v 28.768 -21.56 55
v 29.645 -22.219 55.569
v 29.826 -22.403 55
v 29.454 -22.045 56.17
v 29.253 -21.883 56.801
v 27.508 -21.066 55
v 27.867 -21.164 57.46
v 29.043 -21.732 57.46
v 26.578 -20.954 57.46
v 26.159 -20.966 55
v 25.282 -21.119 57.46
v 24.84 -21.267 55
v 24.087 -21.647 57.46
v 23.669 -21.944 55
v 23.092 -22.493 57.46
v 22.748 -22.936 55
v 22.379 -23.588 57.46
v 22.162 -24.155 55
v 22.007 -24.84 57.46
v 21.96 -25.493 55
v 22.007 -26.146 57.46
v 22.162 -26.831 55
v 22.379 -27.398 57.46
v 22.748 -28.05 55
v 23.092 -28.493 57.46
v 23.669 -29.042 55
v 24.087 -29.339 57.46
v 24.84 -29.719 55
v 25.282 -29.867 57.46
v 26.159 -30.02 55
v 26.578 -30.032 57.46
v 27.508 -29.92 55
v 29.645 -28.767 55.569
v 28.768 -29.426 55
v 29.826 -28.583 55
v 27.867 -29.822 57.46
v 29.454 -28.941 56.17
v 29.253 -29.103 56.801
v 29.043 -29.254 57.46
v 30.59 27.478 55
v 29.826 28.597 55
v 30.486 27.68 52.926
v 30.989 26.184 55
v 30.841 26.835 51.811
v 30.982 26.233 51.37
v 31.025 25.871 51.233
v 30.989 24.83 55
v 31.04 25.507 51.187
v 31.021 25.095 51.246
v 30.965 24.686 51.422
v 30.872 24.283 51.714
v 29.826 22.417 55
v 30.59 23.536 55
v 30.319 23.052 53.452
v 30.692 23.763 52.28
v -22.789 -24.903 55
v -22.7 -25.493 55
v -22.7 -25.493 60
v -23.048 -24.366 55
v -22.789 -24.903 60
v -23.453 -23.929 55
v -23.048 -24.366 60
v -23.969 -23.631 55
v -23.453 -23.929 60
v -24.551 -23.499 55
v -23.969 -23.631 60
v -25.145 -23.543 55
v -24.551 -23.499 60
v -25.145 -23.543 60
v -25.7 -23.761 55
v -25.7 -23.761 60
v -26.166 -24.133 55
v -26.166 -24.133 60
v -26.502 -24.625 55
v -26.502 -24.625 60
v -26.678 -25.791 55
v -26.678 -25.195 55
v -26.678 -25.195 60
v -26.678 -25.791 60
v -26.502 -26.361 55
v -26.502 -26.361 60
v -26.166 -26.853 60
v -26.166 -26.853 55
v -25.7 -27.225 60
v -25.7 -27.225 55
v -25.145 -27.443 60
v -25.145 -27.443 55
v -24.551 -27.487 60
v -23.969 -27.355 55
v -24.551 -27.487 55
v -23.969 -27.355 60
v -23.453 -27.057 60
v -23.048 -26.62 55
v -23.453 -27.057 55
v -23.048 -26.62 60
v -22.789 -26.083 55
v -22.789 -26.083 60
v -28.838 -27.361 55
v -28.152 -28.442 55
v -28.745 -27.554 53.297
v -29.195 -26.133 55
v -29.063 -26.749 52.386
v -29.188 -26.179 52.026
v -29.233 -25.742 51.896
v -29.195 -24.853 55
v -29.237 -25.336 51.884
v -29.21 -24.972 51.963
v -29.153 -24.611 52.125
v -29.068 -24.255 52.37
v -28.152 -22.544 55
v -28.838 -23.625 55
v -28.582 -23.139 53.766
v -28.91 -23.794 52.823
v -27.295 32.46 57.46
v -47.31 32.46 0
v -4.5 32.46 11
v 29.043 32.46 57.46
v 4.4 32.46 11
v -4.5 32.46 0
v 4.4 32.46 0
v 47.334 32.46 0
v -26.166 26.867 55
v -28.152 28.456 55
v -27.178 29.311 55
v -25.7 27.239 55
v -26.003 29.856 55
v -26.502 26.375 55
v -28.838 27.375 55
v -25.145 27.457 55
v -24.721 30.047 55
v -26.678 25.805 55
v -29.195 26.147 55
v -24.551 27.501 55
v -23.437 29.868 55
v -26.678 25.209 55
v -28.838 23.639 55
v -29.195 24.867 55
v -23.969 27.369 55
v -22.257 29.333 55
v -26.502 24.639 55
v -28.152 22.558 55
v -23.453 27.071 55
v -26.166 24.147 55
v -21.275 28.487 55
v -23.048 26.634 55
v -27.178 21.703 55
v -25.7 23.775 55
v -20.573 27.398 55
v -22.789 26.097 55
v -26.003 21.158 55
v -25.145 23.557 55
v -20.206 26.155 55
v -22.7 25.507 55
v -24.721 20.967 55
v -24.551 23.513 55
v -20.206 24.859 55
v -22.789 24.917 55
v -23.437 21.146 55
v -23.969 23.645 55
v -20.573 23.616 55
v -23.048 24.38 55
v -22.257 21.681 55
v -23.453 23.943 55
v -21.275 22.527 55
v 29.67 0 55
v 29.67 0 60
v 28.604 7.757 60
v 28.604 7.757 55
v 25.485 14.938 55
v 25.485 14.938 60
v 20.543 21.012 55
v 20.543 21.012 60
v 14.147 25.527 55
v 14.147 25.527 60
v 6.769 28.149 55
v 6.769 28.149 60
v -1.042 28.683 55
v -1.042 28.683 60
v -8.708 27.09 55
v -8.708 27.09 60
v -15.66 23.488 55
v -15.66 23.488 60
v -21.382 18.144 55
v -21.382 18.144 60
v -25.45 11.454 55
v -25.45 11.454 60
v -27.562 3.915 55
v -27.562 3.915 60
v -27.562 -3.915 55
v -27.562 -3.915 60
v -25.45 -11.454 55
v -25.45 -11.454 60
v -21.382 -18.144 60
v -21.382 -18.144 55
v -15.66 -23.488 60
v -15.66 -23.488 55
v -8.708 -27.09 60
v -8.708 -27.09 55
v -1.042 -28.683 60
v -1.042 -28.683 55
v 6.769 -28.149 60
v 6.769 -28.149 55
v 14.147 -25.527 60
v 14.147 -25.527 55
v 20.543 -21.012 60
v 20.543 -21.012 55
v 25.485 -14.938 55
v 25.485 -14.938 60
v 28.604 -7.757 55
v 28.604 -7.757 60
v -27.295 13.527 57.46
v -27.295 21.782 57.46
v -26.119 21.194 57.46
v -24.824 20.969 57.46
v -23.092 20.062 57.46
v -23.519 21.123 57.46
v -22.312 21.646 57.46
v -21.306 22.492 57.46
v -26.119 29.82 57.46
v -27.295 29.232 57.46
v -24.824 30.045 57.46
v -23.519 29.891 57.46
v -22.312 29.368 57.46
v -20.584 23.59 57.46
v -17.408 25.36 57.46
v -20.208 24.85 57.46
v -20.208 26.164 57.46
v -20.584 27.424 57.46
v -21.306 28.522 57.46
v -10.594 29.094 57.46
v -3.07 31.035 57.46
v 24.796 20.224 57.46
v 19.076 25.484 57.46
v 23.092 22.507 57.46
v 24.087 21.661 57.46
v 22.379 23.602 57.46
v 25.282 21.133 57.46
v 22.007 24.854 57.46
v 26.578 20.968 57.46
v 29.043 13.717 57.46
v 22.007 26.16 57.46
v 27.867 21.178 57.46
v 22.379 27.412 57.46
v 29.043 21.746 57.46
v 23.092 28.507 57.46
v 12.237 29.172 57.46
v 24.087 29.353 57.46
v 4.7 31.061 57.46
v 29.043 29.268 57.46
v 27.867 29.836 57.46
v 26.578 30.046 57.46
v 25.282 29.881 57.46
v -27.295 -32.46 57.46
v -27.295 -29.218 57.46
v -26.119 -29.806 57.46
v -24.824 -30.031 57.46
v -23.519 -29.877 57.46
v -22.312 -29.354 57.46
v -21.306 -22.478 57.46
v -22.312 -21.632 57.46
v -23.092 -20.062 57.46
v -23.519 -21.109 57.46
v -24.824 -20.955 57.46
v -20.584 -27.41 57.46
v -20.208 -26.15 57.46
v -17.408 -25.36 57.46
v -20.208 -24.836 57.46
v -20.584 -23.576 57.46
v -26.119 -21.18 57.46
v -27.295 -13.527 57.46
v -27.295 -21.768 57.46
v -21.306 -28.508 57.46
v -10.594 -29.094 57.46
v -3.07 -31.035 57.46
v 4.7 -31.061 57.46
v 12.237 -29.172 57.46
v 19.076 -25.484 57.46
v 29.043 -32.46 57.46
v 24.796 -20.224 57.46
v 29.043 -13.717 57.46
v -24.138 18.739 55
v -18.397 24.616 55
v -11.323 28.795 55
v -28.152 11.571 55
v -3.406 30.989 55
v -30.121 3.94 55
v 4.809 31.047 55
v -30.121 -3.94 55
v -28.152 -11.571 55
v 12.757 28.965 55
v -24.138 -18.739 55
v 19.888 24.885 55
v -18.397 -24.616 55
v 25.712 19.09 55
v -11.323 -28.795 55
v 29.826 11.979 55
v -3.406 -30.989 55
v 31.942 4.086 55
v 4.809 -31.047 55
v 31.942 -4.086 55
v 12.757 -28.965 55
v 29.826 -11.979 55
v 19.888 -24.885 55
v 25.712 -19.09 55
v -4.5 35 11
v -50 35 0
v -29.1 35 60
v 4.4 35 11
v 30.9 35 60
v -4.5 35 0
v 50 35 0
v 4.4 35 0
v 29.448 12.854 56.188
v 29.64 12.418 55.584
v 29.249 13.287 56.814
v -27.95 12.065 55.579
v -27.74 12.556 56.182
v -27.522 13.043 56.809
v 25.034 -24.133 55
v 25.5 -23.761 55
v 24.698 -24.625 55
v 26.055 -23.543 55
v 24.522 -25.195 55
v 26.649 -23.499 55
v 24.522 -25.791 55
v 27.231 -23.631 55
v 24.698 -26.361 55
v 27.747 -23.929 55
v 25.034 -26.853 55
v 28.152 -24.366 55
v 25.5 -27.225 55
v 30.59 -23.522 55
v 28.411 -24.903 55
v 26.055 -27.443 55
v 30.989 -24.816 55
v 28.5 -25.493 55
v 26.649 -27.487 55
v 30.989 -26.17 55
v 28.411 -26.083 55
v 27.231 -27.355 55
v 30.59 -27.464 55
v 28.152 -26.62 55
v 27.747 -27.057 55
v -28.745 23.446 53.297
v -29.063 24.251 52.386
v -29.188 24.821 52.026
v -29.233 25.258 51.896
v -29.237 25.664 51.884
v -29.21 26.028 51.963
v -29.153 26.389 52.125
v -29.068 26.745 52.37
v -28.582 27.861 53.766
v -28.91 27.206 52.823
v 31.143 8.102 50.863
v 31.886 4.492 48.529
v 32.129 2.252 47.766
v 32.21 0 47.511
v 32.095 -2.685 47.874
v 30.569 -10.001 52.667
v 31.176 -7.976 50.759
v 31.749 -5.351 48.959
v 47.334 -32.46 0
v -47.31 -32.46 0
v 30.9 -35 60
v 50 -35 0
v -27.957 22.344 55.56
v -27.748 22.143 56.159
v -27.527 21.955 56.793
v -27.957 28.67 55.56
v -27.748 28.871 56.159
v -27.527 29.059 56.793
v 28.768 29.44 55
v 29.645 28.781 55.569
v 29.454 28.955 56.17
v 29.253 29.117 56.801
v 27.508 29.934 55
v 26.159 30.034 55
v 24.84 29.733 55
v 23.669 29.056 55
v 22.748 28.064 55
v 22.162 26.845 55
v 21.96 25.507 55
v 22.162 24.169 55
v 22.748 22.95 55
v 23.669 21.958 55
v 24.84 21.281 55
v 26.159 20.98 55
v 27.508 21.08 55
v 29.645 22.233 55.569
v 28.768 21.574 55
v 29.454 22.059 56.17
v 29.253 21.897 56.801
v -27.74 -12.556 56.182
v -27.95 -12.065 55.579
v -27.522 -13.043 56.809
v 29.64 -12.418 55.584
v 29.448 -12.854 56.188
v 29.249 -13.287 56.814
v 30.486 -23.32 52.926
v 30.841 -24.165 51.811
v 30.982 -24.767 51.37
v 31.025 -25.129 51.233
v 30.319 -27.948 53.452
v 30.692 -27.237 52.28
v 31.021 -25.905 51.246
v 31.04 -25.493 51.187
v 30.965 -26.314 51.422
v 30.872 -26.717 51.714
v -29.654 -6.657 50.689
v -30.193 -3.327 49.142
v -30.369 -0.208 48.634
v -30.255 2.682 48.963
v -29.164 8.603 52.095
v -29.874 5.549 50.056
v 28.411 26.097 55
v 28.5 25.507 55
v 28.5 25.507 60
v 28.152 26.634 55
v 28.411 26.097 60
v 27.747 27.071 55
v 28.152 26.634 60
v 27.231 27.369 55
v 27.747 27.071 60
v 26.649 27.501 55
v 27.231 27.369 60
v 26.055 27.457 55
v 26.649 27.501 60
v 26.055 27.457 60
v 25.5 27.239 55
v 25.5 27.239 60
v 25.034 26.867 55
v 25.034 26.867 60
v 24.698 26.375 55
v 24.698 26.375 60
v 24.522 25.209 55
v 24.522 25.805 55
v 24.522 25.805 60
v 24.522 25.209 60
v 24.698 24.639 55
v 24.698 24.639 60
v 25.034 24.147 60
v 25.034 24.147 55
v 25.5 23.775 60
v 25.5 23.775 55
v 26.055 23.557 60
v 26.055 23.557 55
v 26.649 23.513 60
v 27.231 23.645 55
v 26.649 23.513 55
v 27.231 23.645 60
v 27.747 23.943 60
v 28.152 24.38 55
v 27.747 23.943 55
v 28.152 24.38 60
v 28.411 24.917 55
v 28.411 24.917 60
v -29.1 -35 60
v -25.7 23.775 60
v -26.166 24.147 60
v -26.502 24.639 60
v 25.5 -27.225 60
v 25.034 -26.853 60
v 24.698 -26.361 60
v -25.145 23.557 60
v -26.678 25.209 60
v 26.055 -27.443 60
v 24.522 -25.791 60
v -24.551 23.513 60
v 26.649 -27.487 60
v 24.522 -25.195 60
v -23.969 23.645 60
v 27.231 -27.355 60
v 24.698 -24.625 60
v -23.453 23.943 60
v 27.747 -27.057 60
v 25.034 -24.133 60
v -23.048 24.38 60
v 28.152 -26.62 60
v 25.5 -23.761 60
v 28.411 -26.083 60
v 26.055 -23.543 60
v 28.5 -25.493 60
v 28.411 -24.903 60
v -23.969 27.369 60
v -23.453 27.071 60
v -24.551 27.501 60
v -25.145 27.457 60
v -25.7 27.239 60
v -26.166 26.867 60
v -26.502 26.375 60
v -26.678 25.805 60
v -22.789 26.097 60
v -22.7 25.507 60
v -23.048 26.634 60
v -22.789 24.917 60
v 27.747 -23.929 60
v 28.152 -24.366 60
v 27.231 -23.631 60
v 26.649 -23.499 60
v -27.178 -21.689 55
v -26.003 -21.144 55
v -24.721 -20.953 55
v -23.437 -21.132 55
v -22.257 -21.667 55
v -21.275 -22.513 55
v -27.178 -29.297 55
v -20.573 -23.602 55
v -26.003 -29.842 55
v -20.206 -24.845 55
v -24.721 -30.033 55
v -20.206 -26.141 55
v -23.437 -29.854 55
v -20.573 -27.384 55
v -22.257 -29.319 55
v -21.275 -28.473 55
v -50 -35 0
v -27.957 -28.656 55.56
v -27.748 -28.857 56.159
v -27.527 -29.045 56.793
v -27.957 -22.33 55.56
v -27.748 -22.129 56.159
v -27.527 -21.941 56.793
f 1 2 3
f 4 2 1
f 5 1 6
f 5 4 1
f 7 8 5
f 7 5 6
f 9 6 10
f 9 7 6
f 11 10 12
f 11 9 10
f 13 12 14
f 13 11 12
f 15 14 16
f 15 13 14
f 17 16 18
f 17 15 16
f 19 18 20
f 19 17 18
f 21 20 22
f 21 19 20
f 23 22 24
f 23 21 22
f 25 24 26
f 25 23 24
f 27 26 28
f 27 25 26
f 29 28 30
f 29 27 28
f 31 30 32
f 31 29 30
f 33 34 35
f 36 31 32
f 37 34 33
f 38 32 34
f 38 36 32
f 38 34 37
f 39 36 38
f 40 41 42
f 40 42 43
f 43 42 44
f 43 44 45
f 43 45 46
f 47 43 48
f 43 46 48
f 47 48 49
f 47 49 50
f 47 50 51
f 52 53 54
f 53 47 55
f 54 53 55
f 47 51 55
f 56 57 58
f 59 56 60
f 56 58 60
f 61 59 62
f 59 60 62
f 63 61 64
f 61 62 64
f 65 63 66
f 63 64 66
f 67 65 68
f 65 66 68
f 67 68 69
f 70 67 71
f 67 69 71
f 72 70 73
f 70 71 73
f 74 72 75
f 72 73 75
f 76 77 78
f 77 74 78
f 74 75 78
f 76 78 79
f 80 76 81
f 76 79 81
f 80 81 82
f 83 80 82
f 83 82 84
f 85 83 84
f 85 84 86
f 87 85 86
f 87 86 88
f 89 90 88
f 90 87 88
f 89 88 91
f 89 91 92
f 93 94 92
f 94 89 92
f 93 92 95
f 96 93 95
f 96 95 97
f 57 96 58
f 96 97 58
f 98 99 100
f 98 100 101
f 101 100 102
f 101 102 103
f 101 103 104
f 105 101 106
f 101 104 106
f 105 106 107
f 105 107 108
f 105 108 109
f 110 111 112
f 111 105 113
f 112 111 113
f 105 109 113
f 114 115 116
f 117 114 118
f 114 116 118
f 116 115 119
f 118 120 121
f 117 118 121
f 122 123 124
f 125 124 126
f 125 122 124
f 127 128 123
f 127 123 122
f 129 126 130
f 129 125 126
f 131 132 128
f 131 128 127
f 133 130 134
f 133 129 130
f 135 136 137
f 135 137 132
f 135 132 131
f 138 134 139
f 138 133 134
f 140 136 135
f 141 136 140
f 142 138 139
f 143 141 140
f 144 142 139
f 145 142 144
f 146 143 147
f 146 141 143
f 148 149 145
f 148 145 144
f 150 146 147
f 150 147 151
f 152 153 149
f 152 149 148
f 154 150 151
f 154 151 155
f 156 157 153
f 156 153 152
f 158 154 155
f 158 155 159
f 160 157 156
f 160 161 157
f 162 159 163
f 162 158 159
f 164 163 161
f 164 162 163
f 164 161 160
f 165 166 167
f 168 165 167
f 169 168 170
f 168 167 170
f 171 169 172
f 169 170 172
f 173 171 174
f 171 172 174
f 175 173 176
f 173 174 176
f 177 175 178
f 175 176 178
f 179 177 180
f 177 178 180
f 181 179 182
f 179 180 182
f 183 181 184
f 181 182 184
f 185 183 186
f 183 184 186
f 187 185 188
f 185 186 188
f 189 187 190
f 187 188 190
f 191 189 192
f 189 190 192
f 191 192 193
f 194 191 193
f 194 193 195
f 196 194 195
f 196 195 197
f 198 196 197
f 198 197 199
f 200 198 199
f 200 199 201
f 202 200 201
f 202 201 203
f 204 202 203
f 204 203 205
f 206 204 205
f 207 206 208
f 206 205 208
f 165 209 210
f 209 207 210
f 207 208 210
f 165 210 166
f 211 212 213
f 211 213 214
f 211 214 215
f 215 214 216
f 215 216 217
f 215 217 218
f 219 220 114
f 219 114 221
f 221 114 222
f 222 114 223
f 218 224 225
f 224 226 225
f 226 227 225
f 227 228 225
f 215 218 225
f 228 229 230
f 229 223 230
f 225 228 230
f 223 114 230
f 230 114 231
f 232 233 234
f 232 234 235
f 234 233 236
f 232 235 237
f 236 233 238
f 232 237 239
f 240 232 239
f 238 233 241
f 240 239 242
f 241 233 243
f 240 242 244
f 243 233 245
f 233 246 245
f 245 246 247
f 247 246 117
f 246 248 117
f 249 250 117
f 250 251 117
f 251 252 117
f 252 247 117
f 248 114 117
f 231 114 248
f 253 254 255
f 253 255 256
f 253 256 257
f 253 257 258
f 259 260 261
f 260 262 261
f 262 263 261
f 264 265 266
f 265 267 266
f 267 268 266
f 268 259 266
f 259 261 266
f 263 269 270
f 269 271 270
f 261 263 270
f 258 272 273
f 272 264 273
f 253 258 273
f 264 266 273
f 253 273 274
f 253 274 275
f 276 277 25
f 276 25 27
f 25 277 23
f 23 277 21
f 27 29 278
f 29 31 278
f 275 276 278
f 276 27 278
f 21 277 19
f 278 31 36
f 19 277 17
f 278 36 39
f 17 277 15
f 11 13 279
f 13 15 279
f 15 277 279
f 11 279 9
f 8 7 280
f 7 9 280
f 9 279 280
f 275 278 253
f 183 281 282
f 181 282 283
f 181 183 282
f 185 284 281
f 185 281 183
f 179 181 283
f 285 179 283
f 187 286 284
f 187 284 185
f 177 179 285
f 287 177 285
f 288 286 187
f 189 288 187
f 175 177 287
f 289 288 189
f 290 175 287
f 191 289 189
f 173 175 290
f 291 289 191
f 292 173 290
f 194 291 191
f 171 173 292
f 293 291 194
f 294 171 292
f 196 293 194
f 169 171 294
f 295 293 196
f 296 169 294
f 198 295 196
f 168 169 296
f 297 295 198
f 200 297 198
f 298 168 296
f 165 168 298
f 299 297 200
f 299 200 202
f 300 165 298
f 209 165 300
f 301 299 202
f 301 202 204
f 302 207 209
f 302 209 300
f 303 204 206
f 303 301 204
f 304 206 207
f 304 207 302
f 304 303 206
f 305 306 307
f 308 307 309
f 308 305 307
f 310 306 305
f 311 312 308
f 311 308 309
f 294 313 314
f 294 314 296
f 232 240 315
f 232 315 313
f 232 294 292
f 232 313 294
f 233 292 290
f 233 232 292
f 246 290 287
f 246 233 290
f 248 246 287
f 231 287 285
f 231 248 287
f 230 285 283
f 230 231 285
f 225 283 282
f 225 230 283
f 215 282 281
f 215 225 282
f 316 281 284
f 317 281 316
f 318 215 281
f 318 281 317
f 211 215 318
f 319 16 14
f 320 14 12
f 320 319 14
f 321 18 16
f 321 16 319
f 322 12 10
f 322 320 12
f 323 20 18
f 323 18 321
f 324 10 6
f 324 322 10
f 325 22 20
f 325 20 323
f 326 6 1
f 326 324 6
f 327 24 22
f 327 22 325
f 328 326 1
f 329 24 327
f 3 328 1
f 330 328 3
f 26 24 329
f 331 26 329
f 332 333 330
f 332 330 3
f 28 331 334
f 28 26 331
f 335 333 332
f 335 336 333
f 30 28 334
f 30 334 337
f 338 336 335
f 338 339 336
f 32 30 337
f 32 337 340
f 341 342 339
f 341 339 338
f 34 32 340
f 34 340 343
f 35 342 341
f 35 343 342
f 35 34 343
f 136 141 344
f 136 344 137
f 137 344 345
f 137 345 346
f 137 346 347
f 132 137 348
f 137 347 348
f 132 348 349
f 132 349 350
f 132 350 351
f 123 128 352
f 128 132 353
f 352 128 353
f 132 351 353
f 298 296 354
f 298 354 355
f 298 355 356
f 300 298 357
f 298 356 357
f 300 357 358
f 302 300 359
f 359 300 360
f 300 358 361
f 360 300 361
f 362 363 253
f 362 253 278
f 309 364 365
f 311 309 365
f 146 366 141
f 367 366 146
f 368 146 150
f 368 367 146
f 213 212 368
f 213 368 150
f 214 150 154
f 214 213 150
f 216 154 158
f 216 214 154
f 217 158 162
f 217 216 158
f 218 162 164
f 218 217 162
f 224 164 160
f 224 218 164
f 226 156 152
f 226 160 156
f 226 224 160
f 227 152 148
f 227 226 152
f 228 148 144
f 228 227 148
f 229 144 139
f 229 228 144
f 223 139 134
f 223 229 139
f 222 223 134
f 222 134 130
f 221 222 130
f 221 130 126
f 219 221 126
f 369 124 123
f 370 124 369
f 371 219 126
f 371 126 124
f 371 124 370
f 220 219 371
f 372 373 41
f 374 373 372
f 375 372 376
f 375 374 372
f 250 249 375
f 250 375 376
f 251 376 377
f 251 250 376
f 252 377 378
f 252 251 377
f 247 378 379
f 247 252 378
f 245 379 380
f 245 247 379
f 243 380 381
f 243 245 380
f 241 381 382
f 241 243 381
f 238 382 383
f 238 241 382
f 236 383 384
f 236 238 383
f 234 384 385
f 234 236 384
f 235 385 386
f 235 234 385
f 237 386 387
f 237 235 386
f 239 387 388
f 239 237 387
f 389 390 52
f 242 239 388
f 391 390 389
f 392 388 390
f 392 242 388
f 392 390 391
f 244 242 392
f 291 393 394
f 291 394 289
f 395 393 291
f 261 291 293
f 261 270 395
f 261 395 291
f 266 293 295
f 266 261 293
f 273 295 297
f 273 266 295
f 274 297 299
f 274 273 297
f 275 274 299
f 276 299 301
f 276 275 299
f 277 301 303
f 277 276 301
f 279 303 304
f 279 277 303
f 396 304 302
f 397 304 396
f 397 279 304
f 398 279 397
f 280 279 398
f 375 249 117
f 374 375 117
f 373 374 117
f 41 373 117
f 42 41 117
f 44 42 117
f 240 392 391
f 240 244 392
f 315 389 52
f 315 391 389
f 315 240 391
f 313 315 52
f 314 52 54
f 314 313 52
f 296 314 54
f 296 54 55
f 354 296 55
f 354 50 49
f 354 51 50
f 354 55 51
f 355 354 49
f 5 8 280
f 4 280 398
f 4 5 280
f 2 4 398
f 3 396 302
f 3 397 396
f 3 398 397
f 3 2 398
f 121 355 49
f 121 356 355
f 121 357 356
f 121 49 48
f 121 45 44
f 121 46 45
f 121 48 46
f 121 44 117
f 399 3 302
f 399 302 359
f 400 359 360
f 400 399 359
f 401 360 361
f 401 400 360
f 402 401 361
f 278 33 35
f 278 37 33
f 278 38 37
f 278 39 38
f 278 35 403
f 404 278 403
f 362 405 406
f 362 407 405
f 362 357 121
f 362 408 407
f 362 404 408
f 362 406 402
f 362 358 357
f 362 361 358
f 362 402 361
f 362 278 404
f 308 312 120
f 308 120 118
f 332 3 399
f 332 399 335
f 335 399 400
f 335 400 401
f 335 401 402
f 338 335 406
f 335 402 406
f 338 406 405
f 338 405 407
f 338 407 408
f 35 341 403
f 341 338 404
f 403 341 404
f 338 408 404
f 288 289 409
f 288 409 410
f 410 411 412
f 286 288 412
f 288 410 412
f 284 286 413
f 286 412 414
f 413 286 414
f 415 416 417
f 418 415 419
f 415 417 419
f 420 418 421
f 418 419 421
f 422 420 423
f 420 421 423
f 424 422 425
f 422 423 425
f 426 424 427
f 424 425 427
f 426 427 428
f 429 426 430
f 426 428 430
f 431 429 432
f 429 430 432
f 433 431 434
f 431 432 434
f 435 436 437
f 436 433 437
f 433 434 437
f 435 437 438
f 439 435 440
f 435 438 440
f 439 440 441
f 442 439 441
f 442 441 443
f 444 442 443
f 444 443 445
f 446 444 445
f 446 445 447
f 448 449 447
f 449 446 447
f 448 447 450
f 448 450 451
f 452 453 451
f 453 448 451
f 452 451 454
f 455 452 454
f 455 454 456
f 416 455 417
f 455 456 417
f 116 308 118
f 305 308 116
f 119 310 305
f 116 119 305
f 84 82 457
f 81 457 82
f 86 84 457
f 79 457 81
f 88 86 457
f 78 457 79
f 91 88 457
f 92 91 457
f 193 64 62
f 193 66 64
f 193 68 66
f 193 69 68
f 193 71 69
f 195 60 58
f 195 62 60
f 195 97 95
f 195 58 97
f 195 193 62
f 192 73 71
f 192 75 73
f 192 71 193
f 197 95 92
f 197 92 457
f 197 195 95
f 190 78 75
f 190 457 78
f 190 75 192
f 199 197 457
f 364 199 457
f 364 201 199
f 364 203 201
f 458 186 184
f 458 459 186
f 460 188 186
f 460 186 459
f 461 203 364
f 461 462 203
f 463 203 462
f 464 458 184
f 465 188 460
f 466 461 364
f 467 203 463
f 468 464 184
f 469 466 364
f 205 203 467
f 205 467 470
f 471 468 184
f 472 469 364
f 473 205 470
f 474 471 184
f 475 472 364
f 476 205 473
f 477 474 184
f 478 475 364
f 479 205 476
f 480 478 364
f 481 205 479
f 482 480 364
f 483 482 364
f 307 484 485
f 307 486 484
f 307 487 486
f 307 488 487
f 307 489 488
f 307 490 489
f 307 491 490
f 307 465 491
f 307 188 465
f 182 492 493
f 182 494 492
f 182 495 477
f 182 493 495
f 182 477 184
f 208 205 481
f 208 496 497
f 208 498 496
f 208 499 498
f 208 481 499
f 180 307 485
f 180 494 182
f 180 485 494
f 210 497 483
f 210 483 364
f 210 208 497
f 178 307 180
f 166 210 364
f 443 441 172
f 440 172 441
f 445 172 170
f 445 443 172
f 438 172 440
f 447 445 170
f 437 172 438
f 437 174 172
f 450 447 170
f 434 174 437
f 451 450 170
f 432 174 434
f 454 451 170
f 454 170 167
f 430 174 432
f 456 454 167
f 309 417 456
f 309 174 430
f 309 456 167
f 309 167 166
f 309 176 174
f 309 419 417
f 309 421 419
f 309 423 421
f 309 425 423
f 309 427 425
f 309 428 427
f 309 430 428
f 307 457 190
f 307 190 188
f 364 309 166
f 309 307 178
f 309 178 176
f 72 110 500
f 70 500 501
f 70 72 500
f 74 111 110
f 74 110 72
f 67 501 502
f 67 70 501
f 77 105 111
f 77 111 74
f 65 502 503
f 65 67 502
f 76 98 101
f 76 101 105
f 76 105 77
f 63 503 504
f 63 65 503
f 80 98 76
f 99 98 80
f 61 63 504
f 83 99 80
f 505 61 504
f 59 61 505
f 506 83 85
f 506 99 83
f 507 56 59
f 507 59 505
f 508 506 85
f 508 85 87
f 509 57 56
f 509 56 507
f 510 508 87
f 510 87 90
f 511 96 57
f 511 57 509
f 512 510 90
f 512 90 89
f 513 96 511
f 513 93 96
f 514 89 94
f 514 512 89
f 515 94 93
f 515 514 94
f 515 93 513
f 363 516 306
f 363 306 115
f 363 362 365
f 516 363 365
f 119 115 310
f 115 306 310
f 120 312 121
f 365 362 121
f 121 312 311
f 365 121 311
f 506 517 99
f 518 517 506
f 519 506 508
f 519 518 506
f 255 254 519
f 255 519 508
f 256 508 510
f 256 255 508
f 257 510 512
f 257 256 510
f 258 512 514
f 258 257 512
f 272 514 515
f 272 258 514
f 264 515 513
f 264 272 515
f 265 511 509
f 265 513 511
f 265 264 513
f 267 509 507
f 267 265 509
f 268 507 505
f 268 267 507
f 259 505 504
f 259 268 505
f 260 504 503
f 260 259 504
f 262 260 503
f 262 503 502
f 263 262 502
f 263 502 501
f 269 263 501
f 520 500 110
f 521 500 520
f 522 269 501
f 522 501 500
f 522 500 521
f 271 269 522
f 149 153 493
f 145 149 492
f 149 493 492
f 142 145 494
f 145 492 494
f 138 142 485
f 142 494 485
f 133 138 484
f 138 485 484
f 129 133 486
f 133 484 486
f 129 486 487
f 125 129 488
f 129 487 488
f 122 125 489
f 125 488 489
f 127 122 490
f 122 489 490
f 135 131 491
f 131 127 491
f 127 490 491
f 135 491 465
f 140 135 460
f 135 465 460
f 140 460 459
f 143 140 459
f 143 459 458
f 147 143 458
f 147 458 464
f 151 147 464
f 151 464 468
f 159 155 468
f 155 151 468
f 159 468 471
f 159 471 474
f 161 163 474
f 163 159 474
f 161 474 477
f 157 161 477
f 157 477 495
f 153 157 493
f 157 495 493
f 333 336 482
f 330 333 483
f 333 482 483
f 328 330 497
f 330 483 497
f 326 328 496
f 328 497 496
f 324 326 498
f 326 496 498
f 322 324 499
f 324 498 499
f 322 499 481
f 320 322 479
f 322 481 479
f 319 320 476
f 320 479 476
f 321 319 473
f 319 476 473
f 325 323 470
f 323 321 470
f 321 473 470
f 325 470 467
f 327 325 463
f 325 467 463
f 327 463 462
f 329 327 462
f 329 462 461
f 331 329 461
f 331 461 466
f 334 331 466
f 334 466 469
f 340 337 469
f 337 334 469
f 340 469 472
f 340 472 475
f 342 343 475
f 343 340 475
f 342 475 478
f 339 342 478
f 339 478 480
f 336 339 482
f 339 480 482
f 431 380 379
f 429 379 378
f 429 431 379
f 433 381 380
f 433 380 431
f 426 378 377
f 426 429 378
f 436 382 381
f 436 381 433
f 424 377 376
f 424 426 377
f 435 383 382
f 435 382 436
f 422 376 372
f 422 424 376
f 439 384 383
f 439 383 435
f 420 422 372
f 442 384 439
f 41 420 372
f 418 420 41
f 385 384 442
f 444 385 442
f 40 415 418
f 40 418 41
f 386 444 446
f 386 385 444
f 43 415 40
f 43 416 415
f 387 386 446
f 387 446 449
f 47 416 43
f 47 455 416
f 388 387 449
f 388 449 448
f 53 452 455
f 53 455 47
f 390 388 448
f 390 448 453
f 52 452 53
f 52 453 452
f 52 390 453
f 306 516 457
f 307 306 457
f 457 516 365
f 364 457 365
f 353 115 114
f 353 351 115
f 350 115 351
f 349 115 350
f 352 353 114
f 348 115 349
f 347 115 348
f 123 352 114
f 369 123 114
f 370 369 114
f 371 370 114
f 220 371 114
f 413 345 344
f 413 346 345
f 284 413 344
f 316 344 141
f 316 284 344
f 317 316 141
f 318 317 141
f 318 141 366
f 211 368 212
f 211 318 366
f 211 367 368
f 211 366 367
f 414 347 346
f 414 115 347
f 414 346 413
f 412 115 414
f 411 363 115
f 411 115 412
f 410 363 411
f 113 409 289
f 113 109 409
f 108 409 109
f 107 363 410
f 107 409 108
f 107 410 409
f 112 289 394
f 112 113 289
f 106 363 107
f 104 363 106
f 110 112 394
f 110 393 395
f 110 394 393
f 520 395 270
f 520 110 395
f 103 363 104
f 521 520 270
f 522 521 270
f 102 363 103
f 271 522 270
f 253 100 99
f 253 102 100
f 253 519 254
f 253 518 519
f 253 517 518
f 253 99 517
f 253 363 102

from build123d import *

# Parameters (mm, degrees)
F0_W      = 100
F0_H      = 70
F1_DEPTH  = 60
F3_DEPTH  = 70.001
F4_R      = 2
F5_DEPTH  = 60.001
F6_R      = 28.75
F7_DEPTH  = 60.001
F8_T      = -2.54
F9_R      = 31.29
F9_R_2    = 28.75
F9_R_3    = 4.54
F9_R_4    = 2
F10_DEPTH = 55
F11_W     = 8.9
F11_H     = 11
F12_DEPTH = 25.4


with BuildPart() as f1:
    # F0 (on Top) → F1 (new body)
    with BuildSketch(Plane.XY):
        Rectangle(F0_W, F0_H)
    extrude(amount=F1_DEPTH)

    # F2 (on face) → F3 (cut, through all)
    with BuildSketch(Plane.XZ.offset(35)):
        Polygon((-50, 60), (-50, 0), (-29.1, 60), align=None)
        Polygon((30.9, 60), (50, 0), (50, 60), align=None)
    extrude(amount=-F3_DEPTH, mode=Mode.SUBTRACT)

    # F4 (on face) → F5 (cut, through all)
    with BuildSketch(Plane.XY.offset(60)):
        with Locations((-24.7, 25.507)):
            Circle(F4_R)
        with Locations((26.5, 25.507)):
            Circle(F4_R)
        with Locations((26.5, -25.493)):
            Circle(F4_R)
        with Locations((-24.7, -25.493)):
            Circle(F4_R)
    extrude(amount=-F5_DEPTH, mode=Mode.SUBTRACT)

    # F6 (on face) → F7 (cut, through all)
    with BuildSketch(Plane.XY.offset(60)):
        with Locations((0.92, 0)):
            Circle(F6_R)
    extrude(amount=-F7_DEPTH, mode=Mode.SUBTRACT)

    # F8
    f8_openings = [f1.faces().sort_by_distance(p)[0] for p in [
        (0, 33.779344, 0),
    ]]
    offset(amount=F8_T, openings=f8_openings)

    # F9 (on face) → F10 (cut)
    with BuildSketch(Plane(origin=(0, 0, 0), x_dir=(1, 0, 0), z_dir=(0, 0, -1))):
        with Locations((0.92, 0)):
            Circle(F9_R)
        with Locations((0.92, 0)):
            Circle(F9_R_2, mode=Mode.SUBTRACT)
        with Locations((-24.7, 25.493)):
            Circle(F9_R_3)
        with Locations((-24.7, 25.493)):
            Circle(F9_R_4, mode=Mode.SUBTRACT)
        with Locations((26.5, 25.493)):
            Circle(F9_R_3)
        with Locations((26.5, 25.493)):
            Circle(F9_R_4, mode=Mode.SUBTRACT)
        with Locations((26.5, -25.507)):
            Circle(F9_R_3)
        with Locations((26.5, -25.507)):
            Circle(F9_R_4, mode=Mode.SUBTRACT)
        with Locations((-24.7, -25.507)):
            Circle(F9_R_3)
        with Locations((-24.7, -25.507)):
            Circle(F9_R_4, mode=Mode.SUBTRACT)
    extrude(amount=-F10_DEPTH, mode=Mode.SUBTRACT)

    # F11 (on face) → F12 (cut)
    with BuildSketch(Plane(origin=(0, 35, 0), x_dir=(-1, 0, 0), z_dir=(0, 1, 0))):
        with Locations((0.05, 5.5)):
            Rectangle(F11_W, F11_H)
    extrude(amount=-F12_DEPTH, mode=Mode.SUBTRACT)


solid = f1.part
